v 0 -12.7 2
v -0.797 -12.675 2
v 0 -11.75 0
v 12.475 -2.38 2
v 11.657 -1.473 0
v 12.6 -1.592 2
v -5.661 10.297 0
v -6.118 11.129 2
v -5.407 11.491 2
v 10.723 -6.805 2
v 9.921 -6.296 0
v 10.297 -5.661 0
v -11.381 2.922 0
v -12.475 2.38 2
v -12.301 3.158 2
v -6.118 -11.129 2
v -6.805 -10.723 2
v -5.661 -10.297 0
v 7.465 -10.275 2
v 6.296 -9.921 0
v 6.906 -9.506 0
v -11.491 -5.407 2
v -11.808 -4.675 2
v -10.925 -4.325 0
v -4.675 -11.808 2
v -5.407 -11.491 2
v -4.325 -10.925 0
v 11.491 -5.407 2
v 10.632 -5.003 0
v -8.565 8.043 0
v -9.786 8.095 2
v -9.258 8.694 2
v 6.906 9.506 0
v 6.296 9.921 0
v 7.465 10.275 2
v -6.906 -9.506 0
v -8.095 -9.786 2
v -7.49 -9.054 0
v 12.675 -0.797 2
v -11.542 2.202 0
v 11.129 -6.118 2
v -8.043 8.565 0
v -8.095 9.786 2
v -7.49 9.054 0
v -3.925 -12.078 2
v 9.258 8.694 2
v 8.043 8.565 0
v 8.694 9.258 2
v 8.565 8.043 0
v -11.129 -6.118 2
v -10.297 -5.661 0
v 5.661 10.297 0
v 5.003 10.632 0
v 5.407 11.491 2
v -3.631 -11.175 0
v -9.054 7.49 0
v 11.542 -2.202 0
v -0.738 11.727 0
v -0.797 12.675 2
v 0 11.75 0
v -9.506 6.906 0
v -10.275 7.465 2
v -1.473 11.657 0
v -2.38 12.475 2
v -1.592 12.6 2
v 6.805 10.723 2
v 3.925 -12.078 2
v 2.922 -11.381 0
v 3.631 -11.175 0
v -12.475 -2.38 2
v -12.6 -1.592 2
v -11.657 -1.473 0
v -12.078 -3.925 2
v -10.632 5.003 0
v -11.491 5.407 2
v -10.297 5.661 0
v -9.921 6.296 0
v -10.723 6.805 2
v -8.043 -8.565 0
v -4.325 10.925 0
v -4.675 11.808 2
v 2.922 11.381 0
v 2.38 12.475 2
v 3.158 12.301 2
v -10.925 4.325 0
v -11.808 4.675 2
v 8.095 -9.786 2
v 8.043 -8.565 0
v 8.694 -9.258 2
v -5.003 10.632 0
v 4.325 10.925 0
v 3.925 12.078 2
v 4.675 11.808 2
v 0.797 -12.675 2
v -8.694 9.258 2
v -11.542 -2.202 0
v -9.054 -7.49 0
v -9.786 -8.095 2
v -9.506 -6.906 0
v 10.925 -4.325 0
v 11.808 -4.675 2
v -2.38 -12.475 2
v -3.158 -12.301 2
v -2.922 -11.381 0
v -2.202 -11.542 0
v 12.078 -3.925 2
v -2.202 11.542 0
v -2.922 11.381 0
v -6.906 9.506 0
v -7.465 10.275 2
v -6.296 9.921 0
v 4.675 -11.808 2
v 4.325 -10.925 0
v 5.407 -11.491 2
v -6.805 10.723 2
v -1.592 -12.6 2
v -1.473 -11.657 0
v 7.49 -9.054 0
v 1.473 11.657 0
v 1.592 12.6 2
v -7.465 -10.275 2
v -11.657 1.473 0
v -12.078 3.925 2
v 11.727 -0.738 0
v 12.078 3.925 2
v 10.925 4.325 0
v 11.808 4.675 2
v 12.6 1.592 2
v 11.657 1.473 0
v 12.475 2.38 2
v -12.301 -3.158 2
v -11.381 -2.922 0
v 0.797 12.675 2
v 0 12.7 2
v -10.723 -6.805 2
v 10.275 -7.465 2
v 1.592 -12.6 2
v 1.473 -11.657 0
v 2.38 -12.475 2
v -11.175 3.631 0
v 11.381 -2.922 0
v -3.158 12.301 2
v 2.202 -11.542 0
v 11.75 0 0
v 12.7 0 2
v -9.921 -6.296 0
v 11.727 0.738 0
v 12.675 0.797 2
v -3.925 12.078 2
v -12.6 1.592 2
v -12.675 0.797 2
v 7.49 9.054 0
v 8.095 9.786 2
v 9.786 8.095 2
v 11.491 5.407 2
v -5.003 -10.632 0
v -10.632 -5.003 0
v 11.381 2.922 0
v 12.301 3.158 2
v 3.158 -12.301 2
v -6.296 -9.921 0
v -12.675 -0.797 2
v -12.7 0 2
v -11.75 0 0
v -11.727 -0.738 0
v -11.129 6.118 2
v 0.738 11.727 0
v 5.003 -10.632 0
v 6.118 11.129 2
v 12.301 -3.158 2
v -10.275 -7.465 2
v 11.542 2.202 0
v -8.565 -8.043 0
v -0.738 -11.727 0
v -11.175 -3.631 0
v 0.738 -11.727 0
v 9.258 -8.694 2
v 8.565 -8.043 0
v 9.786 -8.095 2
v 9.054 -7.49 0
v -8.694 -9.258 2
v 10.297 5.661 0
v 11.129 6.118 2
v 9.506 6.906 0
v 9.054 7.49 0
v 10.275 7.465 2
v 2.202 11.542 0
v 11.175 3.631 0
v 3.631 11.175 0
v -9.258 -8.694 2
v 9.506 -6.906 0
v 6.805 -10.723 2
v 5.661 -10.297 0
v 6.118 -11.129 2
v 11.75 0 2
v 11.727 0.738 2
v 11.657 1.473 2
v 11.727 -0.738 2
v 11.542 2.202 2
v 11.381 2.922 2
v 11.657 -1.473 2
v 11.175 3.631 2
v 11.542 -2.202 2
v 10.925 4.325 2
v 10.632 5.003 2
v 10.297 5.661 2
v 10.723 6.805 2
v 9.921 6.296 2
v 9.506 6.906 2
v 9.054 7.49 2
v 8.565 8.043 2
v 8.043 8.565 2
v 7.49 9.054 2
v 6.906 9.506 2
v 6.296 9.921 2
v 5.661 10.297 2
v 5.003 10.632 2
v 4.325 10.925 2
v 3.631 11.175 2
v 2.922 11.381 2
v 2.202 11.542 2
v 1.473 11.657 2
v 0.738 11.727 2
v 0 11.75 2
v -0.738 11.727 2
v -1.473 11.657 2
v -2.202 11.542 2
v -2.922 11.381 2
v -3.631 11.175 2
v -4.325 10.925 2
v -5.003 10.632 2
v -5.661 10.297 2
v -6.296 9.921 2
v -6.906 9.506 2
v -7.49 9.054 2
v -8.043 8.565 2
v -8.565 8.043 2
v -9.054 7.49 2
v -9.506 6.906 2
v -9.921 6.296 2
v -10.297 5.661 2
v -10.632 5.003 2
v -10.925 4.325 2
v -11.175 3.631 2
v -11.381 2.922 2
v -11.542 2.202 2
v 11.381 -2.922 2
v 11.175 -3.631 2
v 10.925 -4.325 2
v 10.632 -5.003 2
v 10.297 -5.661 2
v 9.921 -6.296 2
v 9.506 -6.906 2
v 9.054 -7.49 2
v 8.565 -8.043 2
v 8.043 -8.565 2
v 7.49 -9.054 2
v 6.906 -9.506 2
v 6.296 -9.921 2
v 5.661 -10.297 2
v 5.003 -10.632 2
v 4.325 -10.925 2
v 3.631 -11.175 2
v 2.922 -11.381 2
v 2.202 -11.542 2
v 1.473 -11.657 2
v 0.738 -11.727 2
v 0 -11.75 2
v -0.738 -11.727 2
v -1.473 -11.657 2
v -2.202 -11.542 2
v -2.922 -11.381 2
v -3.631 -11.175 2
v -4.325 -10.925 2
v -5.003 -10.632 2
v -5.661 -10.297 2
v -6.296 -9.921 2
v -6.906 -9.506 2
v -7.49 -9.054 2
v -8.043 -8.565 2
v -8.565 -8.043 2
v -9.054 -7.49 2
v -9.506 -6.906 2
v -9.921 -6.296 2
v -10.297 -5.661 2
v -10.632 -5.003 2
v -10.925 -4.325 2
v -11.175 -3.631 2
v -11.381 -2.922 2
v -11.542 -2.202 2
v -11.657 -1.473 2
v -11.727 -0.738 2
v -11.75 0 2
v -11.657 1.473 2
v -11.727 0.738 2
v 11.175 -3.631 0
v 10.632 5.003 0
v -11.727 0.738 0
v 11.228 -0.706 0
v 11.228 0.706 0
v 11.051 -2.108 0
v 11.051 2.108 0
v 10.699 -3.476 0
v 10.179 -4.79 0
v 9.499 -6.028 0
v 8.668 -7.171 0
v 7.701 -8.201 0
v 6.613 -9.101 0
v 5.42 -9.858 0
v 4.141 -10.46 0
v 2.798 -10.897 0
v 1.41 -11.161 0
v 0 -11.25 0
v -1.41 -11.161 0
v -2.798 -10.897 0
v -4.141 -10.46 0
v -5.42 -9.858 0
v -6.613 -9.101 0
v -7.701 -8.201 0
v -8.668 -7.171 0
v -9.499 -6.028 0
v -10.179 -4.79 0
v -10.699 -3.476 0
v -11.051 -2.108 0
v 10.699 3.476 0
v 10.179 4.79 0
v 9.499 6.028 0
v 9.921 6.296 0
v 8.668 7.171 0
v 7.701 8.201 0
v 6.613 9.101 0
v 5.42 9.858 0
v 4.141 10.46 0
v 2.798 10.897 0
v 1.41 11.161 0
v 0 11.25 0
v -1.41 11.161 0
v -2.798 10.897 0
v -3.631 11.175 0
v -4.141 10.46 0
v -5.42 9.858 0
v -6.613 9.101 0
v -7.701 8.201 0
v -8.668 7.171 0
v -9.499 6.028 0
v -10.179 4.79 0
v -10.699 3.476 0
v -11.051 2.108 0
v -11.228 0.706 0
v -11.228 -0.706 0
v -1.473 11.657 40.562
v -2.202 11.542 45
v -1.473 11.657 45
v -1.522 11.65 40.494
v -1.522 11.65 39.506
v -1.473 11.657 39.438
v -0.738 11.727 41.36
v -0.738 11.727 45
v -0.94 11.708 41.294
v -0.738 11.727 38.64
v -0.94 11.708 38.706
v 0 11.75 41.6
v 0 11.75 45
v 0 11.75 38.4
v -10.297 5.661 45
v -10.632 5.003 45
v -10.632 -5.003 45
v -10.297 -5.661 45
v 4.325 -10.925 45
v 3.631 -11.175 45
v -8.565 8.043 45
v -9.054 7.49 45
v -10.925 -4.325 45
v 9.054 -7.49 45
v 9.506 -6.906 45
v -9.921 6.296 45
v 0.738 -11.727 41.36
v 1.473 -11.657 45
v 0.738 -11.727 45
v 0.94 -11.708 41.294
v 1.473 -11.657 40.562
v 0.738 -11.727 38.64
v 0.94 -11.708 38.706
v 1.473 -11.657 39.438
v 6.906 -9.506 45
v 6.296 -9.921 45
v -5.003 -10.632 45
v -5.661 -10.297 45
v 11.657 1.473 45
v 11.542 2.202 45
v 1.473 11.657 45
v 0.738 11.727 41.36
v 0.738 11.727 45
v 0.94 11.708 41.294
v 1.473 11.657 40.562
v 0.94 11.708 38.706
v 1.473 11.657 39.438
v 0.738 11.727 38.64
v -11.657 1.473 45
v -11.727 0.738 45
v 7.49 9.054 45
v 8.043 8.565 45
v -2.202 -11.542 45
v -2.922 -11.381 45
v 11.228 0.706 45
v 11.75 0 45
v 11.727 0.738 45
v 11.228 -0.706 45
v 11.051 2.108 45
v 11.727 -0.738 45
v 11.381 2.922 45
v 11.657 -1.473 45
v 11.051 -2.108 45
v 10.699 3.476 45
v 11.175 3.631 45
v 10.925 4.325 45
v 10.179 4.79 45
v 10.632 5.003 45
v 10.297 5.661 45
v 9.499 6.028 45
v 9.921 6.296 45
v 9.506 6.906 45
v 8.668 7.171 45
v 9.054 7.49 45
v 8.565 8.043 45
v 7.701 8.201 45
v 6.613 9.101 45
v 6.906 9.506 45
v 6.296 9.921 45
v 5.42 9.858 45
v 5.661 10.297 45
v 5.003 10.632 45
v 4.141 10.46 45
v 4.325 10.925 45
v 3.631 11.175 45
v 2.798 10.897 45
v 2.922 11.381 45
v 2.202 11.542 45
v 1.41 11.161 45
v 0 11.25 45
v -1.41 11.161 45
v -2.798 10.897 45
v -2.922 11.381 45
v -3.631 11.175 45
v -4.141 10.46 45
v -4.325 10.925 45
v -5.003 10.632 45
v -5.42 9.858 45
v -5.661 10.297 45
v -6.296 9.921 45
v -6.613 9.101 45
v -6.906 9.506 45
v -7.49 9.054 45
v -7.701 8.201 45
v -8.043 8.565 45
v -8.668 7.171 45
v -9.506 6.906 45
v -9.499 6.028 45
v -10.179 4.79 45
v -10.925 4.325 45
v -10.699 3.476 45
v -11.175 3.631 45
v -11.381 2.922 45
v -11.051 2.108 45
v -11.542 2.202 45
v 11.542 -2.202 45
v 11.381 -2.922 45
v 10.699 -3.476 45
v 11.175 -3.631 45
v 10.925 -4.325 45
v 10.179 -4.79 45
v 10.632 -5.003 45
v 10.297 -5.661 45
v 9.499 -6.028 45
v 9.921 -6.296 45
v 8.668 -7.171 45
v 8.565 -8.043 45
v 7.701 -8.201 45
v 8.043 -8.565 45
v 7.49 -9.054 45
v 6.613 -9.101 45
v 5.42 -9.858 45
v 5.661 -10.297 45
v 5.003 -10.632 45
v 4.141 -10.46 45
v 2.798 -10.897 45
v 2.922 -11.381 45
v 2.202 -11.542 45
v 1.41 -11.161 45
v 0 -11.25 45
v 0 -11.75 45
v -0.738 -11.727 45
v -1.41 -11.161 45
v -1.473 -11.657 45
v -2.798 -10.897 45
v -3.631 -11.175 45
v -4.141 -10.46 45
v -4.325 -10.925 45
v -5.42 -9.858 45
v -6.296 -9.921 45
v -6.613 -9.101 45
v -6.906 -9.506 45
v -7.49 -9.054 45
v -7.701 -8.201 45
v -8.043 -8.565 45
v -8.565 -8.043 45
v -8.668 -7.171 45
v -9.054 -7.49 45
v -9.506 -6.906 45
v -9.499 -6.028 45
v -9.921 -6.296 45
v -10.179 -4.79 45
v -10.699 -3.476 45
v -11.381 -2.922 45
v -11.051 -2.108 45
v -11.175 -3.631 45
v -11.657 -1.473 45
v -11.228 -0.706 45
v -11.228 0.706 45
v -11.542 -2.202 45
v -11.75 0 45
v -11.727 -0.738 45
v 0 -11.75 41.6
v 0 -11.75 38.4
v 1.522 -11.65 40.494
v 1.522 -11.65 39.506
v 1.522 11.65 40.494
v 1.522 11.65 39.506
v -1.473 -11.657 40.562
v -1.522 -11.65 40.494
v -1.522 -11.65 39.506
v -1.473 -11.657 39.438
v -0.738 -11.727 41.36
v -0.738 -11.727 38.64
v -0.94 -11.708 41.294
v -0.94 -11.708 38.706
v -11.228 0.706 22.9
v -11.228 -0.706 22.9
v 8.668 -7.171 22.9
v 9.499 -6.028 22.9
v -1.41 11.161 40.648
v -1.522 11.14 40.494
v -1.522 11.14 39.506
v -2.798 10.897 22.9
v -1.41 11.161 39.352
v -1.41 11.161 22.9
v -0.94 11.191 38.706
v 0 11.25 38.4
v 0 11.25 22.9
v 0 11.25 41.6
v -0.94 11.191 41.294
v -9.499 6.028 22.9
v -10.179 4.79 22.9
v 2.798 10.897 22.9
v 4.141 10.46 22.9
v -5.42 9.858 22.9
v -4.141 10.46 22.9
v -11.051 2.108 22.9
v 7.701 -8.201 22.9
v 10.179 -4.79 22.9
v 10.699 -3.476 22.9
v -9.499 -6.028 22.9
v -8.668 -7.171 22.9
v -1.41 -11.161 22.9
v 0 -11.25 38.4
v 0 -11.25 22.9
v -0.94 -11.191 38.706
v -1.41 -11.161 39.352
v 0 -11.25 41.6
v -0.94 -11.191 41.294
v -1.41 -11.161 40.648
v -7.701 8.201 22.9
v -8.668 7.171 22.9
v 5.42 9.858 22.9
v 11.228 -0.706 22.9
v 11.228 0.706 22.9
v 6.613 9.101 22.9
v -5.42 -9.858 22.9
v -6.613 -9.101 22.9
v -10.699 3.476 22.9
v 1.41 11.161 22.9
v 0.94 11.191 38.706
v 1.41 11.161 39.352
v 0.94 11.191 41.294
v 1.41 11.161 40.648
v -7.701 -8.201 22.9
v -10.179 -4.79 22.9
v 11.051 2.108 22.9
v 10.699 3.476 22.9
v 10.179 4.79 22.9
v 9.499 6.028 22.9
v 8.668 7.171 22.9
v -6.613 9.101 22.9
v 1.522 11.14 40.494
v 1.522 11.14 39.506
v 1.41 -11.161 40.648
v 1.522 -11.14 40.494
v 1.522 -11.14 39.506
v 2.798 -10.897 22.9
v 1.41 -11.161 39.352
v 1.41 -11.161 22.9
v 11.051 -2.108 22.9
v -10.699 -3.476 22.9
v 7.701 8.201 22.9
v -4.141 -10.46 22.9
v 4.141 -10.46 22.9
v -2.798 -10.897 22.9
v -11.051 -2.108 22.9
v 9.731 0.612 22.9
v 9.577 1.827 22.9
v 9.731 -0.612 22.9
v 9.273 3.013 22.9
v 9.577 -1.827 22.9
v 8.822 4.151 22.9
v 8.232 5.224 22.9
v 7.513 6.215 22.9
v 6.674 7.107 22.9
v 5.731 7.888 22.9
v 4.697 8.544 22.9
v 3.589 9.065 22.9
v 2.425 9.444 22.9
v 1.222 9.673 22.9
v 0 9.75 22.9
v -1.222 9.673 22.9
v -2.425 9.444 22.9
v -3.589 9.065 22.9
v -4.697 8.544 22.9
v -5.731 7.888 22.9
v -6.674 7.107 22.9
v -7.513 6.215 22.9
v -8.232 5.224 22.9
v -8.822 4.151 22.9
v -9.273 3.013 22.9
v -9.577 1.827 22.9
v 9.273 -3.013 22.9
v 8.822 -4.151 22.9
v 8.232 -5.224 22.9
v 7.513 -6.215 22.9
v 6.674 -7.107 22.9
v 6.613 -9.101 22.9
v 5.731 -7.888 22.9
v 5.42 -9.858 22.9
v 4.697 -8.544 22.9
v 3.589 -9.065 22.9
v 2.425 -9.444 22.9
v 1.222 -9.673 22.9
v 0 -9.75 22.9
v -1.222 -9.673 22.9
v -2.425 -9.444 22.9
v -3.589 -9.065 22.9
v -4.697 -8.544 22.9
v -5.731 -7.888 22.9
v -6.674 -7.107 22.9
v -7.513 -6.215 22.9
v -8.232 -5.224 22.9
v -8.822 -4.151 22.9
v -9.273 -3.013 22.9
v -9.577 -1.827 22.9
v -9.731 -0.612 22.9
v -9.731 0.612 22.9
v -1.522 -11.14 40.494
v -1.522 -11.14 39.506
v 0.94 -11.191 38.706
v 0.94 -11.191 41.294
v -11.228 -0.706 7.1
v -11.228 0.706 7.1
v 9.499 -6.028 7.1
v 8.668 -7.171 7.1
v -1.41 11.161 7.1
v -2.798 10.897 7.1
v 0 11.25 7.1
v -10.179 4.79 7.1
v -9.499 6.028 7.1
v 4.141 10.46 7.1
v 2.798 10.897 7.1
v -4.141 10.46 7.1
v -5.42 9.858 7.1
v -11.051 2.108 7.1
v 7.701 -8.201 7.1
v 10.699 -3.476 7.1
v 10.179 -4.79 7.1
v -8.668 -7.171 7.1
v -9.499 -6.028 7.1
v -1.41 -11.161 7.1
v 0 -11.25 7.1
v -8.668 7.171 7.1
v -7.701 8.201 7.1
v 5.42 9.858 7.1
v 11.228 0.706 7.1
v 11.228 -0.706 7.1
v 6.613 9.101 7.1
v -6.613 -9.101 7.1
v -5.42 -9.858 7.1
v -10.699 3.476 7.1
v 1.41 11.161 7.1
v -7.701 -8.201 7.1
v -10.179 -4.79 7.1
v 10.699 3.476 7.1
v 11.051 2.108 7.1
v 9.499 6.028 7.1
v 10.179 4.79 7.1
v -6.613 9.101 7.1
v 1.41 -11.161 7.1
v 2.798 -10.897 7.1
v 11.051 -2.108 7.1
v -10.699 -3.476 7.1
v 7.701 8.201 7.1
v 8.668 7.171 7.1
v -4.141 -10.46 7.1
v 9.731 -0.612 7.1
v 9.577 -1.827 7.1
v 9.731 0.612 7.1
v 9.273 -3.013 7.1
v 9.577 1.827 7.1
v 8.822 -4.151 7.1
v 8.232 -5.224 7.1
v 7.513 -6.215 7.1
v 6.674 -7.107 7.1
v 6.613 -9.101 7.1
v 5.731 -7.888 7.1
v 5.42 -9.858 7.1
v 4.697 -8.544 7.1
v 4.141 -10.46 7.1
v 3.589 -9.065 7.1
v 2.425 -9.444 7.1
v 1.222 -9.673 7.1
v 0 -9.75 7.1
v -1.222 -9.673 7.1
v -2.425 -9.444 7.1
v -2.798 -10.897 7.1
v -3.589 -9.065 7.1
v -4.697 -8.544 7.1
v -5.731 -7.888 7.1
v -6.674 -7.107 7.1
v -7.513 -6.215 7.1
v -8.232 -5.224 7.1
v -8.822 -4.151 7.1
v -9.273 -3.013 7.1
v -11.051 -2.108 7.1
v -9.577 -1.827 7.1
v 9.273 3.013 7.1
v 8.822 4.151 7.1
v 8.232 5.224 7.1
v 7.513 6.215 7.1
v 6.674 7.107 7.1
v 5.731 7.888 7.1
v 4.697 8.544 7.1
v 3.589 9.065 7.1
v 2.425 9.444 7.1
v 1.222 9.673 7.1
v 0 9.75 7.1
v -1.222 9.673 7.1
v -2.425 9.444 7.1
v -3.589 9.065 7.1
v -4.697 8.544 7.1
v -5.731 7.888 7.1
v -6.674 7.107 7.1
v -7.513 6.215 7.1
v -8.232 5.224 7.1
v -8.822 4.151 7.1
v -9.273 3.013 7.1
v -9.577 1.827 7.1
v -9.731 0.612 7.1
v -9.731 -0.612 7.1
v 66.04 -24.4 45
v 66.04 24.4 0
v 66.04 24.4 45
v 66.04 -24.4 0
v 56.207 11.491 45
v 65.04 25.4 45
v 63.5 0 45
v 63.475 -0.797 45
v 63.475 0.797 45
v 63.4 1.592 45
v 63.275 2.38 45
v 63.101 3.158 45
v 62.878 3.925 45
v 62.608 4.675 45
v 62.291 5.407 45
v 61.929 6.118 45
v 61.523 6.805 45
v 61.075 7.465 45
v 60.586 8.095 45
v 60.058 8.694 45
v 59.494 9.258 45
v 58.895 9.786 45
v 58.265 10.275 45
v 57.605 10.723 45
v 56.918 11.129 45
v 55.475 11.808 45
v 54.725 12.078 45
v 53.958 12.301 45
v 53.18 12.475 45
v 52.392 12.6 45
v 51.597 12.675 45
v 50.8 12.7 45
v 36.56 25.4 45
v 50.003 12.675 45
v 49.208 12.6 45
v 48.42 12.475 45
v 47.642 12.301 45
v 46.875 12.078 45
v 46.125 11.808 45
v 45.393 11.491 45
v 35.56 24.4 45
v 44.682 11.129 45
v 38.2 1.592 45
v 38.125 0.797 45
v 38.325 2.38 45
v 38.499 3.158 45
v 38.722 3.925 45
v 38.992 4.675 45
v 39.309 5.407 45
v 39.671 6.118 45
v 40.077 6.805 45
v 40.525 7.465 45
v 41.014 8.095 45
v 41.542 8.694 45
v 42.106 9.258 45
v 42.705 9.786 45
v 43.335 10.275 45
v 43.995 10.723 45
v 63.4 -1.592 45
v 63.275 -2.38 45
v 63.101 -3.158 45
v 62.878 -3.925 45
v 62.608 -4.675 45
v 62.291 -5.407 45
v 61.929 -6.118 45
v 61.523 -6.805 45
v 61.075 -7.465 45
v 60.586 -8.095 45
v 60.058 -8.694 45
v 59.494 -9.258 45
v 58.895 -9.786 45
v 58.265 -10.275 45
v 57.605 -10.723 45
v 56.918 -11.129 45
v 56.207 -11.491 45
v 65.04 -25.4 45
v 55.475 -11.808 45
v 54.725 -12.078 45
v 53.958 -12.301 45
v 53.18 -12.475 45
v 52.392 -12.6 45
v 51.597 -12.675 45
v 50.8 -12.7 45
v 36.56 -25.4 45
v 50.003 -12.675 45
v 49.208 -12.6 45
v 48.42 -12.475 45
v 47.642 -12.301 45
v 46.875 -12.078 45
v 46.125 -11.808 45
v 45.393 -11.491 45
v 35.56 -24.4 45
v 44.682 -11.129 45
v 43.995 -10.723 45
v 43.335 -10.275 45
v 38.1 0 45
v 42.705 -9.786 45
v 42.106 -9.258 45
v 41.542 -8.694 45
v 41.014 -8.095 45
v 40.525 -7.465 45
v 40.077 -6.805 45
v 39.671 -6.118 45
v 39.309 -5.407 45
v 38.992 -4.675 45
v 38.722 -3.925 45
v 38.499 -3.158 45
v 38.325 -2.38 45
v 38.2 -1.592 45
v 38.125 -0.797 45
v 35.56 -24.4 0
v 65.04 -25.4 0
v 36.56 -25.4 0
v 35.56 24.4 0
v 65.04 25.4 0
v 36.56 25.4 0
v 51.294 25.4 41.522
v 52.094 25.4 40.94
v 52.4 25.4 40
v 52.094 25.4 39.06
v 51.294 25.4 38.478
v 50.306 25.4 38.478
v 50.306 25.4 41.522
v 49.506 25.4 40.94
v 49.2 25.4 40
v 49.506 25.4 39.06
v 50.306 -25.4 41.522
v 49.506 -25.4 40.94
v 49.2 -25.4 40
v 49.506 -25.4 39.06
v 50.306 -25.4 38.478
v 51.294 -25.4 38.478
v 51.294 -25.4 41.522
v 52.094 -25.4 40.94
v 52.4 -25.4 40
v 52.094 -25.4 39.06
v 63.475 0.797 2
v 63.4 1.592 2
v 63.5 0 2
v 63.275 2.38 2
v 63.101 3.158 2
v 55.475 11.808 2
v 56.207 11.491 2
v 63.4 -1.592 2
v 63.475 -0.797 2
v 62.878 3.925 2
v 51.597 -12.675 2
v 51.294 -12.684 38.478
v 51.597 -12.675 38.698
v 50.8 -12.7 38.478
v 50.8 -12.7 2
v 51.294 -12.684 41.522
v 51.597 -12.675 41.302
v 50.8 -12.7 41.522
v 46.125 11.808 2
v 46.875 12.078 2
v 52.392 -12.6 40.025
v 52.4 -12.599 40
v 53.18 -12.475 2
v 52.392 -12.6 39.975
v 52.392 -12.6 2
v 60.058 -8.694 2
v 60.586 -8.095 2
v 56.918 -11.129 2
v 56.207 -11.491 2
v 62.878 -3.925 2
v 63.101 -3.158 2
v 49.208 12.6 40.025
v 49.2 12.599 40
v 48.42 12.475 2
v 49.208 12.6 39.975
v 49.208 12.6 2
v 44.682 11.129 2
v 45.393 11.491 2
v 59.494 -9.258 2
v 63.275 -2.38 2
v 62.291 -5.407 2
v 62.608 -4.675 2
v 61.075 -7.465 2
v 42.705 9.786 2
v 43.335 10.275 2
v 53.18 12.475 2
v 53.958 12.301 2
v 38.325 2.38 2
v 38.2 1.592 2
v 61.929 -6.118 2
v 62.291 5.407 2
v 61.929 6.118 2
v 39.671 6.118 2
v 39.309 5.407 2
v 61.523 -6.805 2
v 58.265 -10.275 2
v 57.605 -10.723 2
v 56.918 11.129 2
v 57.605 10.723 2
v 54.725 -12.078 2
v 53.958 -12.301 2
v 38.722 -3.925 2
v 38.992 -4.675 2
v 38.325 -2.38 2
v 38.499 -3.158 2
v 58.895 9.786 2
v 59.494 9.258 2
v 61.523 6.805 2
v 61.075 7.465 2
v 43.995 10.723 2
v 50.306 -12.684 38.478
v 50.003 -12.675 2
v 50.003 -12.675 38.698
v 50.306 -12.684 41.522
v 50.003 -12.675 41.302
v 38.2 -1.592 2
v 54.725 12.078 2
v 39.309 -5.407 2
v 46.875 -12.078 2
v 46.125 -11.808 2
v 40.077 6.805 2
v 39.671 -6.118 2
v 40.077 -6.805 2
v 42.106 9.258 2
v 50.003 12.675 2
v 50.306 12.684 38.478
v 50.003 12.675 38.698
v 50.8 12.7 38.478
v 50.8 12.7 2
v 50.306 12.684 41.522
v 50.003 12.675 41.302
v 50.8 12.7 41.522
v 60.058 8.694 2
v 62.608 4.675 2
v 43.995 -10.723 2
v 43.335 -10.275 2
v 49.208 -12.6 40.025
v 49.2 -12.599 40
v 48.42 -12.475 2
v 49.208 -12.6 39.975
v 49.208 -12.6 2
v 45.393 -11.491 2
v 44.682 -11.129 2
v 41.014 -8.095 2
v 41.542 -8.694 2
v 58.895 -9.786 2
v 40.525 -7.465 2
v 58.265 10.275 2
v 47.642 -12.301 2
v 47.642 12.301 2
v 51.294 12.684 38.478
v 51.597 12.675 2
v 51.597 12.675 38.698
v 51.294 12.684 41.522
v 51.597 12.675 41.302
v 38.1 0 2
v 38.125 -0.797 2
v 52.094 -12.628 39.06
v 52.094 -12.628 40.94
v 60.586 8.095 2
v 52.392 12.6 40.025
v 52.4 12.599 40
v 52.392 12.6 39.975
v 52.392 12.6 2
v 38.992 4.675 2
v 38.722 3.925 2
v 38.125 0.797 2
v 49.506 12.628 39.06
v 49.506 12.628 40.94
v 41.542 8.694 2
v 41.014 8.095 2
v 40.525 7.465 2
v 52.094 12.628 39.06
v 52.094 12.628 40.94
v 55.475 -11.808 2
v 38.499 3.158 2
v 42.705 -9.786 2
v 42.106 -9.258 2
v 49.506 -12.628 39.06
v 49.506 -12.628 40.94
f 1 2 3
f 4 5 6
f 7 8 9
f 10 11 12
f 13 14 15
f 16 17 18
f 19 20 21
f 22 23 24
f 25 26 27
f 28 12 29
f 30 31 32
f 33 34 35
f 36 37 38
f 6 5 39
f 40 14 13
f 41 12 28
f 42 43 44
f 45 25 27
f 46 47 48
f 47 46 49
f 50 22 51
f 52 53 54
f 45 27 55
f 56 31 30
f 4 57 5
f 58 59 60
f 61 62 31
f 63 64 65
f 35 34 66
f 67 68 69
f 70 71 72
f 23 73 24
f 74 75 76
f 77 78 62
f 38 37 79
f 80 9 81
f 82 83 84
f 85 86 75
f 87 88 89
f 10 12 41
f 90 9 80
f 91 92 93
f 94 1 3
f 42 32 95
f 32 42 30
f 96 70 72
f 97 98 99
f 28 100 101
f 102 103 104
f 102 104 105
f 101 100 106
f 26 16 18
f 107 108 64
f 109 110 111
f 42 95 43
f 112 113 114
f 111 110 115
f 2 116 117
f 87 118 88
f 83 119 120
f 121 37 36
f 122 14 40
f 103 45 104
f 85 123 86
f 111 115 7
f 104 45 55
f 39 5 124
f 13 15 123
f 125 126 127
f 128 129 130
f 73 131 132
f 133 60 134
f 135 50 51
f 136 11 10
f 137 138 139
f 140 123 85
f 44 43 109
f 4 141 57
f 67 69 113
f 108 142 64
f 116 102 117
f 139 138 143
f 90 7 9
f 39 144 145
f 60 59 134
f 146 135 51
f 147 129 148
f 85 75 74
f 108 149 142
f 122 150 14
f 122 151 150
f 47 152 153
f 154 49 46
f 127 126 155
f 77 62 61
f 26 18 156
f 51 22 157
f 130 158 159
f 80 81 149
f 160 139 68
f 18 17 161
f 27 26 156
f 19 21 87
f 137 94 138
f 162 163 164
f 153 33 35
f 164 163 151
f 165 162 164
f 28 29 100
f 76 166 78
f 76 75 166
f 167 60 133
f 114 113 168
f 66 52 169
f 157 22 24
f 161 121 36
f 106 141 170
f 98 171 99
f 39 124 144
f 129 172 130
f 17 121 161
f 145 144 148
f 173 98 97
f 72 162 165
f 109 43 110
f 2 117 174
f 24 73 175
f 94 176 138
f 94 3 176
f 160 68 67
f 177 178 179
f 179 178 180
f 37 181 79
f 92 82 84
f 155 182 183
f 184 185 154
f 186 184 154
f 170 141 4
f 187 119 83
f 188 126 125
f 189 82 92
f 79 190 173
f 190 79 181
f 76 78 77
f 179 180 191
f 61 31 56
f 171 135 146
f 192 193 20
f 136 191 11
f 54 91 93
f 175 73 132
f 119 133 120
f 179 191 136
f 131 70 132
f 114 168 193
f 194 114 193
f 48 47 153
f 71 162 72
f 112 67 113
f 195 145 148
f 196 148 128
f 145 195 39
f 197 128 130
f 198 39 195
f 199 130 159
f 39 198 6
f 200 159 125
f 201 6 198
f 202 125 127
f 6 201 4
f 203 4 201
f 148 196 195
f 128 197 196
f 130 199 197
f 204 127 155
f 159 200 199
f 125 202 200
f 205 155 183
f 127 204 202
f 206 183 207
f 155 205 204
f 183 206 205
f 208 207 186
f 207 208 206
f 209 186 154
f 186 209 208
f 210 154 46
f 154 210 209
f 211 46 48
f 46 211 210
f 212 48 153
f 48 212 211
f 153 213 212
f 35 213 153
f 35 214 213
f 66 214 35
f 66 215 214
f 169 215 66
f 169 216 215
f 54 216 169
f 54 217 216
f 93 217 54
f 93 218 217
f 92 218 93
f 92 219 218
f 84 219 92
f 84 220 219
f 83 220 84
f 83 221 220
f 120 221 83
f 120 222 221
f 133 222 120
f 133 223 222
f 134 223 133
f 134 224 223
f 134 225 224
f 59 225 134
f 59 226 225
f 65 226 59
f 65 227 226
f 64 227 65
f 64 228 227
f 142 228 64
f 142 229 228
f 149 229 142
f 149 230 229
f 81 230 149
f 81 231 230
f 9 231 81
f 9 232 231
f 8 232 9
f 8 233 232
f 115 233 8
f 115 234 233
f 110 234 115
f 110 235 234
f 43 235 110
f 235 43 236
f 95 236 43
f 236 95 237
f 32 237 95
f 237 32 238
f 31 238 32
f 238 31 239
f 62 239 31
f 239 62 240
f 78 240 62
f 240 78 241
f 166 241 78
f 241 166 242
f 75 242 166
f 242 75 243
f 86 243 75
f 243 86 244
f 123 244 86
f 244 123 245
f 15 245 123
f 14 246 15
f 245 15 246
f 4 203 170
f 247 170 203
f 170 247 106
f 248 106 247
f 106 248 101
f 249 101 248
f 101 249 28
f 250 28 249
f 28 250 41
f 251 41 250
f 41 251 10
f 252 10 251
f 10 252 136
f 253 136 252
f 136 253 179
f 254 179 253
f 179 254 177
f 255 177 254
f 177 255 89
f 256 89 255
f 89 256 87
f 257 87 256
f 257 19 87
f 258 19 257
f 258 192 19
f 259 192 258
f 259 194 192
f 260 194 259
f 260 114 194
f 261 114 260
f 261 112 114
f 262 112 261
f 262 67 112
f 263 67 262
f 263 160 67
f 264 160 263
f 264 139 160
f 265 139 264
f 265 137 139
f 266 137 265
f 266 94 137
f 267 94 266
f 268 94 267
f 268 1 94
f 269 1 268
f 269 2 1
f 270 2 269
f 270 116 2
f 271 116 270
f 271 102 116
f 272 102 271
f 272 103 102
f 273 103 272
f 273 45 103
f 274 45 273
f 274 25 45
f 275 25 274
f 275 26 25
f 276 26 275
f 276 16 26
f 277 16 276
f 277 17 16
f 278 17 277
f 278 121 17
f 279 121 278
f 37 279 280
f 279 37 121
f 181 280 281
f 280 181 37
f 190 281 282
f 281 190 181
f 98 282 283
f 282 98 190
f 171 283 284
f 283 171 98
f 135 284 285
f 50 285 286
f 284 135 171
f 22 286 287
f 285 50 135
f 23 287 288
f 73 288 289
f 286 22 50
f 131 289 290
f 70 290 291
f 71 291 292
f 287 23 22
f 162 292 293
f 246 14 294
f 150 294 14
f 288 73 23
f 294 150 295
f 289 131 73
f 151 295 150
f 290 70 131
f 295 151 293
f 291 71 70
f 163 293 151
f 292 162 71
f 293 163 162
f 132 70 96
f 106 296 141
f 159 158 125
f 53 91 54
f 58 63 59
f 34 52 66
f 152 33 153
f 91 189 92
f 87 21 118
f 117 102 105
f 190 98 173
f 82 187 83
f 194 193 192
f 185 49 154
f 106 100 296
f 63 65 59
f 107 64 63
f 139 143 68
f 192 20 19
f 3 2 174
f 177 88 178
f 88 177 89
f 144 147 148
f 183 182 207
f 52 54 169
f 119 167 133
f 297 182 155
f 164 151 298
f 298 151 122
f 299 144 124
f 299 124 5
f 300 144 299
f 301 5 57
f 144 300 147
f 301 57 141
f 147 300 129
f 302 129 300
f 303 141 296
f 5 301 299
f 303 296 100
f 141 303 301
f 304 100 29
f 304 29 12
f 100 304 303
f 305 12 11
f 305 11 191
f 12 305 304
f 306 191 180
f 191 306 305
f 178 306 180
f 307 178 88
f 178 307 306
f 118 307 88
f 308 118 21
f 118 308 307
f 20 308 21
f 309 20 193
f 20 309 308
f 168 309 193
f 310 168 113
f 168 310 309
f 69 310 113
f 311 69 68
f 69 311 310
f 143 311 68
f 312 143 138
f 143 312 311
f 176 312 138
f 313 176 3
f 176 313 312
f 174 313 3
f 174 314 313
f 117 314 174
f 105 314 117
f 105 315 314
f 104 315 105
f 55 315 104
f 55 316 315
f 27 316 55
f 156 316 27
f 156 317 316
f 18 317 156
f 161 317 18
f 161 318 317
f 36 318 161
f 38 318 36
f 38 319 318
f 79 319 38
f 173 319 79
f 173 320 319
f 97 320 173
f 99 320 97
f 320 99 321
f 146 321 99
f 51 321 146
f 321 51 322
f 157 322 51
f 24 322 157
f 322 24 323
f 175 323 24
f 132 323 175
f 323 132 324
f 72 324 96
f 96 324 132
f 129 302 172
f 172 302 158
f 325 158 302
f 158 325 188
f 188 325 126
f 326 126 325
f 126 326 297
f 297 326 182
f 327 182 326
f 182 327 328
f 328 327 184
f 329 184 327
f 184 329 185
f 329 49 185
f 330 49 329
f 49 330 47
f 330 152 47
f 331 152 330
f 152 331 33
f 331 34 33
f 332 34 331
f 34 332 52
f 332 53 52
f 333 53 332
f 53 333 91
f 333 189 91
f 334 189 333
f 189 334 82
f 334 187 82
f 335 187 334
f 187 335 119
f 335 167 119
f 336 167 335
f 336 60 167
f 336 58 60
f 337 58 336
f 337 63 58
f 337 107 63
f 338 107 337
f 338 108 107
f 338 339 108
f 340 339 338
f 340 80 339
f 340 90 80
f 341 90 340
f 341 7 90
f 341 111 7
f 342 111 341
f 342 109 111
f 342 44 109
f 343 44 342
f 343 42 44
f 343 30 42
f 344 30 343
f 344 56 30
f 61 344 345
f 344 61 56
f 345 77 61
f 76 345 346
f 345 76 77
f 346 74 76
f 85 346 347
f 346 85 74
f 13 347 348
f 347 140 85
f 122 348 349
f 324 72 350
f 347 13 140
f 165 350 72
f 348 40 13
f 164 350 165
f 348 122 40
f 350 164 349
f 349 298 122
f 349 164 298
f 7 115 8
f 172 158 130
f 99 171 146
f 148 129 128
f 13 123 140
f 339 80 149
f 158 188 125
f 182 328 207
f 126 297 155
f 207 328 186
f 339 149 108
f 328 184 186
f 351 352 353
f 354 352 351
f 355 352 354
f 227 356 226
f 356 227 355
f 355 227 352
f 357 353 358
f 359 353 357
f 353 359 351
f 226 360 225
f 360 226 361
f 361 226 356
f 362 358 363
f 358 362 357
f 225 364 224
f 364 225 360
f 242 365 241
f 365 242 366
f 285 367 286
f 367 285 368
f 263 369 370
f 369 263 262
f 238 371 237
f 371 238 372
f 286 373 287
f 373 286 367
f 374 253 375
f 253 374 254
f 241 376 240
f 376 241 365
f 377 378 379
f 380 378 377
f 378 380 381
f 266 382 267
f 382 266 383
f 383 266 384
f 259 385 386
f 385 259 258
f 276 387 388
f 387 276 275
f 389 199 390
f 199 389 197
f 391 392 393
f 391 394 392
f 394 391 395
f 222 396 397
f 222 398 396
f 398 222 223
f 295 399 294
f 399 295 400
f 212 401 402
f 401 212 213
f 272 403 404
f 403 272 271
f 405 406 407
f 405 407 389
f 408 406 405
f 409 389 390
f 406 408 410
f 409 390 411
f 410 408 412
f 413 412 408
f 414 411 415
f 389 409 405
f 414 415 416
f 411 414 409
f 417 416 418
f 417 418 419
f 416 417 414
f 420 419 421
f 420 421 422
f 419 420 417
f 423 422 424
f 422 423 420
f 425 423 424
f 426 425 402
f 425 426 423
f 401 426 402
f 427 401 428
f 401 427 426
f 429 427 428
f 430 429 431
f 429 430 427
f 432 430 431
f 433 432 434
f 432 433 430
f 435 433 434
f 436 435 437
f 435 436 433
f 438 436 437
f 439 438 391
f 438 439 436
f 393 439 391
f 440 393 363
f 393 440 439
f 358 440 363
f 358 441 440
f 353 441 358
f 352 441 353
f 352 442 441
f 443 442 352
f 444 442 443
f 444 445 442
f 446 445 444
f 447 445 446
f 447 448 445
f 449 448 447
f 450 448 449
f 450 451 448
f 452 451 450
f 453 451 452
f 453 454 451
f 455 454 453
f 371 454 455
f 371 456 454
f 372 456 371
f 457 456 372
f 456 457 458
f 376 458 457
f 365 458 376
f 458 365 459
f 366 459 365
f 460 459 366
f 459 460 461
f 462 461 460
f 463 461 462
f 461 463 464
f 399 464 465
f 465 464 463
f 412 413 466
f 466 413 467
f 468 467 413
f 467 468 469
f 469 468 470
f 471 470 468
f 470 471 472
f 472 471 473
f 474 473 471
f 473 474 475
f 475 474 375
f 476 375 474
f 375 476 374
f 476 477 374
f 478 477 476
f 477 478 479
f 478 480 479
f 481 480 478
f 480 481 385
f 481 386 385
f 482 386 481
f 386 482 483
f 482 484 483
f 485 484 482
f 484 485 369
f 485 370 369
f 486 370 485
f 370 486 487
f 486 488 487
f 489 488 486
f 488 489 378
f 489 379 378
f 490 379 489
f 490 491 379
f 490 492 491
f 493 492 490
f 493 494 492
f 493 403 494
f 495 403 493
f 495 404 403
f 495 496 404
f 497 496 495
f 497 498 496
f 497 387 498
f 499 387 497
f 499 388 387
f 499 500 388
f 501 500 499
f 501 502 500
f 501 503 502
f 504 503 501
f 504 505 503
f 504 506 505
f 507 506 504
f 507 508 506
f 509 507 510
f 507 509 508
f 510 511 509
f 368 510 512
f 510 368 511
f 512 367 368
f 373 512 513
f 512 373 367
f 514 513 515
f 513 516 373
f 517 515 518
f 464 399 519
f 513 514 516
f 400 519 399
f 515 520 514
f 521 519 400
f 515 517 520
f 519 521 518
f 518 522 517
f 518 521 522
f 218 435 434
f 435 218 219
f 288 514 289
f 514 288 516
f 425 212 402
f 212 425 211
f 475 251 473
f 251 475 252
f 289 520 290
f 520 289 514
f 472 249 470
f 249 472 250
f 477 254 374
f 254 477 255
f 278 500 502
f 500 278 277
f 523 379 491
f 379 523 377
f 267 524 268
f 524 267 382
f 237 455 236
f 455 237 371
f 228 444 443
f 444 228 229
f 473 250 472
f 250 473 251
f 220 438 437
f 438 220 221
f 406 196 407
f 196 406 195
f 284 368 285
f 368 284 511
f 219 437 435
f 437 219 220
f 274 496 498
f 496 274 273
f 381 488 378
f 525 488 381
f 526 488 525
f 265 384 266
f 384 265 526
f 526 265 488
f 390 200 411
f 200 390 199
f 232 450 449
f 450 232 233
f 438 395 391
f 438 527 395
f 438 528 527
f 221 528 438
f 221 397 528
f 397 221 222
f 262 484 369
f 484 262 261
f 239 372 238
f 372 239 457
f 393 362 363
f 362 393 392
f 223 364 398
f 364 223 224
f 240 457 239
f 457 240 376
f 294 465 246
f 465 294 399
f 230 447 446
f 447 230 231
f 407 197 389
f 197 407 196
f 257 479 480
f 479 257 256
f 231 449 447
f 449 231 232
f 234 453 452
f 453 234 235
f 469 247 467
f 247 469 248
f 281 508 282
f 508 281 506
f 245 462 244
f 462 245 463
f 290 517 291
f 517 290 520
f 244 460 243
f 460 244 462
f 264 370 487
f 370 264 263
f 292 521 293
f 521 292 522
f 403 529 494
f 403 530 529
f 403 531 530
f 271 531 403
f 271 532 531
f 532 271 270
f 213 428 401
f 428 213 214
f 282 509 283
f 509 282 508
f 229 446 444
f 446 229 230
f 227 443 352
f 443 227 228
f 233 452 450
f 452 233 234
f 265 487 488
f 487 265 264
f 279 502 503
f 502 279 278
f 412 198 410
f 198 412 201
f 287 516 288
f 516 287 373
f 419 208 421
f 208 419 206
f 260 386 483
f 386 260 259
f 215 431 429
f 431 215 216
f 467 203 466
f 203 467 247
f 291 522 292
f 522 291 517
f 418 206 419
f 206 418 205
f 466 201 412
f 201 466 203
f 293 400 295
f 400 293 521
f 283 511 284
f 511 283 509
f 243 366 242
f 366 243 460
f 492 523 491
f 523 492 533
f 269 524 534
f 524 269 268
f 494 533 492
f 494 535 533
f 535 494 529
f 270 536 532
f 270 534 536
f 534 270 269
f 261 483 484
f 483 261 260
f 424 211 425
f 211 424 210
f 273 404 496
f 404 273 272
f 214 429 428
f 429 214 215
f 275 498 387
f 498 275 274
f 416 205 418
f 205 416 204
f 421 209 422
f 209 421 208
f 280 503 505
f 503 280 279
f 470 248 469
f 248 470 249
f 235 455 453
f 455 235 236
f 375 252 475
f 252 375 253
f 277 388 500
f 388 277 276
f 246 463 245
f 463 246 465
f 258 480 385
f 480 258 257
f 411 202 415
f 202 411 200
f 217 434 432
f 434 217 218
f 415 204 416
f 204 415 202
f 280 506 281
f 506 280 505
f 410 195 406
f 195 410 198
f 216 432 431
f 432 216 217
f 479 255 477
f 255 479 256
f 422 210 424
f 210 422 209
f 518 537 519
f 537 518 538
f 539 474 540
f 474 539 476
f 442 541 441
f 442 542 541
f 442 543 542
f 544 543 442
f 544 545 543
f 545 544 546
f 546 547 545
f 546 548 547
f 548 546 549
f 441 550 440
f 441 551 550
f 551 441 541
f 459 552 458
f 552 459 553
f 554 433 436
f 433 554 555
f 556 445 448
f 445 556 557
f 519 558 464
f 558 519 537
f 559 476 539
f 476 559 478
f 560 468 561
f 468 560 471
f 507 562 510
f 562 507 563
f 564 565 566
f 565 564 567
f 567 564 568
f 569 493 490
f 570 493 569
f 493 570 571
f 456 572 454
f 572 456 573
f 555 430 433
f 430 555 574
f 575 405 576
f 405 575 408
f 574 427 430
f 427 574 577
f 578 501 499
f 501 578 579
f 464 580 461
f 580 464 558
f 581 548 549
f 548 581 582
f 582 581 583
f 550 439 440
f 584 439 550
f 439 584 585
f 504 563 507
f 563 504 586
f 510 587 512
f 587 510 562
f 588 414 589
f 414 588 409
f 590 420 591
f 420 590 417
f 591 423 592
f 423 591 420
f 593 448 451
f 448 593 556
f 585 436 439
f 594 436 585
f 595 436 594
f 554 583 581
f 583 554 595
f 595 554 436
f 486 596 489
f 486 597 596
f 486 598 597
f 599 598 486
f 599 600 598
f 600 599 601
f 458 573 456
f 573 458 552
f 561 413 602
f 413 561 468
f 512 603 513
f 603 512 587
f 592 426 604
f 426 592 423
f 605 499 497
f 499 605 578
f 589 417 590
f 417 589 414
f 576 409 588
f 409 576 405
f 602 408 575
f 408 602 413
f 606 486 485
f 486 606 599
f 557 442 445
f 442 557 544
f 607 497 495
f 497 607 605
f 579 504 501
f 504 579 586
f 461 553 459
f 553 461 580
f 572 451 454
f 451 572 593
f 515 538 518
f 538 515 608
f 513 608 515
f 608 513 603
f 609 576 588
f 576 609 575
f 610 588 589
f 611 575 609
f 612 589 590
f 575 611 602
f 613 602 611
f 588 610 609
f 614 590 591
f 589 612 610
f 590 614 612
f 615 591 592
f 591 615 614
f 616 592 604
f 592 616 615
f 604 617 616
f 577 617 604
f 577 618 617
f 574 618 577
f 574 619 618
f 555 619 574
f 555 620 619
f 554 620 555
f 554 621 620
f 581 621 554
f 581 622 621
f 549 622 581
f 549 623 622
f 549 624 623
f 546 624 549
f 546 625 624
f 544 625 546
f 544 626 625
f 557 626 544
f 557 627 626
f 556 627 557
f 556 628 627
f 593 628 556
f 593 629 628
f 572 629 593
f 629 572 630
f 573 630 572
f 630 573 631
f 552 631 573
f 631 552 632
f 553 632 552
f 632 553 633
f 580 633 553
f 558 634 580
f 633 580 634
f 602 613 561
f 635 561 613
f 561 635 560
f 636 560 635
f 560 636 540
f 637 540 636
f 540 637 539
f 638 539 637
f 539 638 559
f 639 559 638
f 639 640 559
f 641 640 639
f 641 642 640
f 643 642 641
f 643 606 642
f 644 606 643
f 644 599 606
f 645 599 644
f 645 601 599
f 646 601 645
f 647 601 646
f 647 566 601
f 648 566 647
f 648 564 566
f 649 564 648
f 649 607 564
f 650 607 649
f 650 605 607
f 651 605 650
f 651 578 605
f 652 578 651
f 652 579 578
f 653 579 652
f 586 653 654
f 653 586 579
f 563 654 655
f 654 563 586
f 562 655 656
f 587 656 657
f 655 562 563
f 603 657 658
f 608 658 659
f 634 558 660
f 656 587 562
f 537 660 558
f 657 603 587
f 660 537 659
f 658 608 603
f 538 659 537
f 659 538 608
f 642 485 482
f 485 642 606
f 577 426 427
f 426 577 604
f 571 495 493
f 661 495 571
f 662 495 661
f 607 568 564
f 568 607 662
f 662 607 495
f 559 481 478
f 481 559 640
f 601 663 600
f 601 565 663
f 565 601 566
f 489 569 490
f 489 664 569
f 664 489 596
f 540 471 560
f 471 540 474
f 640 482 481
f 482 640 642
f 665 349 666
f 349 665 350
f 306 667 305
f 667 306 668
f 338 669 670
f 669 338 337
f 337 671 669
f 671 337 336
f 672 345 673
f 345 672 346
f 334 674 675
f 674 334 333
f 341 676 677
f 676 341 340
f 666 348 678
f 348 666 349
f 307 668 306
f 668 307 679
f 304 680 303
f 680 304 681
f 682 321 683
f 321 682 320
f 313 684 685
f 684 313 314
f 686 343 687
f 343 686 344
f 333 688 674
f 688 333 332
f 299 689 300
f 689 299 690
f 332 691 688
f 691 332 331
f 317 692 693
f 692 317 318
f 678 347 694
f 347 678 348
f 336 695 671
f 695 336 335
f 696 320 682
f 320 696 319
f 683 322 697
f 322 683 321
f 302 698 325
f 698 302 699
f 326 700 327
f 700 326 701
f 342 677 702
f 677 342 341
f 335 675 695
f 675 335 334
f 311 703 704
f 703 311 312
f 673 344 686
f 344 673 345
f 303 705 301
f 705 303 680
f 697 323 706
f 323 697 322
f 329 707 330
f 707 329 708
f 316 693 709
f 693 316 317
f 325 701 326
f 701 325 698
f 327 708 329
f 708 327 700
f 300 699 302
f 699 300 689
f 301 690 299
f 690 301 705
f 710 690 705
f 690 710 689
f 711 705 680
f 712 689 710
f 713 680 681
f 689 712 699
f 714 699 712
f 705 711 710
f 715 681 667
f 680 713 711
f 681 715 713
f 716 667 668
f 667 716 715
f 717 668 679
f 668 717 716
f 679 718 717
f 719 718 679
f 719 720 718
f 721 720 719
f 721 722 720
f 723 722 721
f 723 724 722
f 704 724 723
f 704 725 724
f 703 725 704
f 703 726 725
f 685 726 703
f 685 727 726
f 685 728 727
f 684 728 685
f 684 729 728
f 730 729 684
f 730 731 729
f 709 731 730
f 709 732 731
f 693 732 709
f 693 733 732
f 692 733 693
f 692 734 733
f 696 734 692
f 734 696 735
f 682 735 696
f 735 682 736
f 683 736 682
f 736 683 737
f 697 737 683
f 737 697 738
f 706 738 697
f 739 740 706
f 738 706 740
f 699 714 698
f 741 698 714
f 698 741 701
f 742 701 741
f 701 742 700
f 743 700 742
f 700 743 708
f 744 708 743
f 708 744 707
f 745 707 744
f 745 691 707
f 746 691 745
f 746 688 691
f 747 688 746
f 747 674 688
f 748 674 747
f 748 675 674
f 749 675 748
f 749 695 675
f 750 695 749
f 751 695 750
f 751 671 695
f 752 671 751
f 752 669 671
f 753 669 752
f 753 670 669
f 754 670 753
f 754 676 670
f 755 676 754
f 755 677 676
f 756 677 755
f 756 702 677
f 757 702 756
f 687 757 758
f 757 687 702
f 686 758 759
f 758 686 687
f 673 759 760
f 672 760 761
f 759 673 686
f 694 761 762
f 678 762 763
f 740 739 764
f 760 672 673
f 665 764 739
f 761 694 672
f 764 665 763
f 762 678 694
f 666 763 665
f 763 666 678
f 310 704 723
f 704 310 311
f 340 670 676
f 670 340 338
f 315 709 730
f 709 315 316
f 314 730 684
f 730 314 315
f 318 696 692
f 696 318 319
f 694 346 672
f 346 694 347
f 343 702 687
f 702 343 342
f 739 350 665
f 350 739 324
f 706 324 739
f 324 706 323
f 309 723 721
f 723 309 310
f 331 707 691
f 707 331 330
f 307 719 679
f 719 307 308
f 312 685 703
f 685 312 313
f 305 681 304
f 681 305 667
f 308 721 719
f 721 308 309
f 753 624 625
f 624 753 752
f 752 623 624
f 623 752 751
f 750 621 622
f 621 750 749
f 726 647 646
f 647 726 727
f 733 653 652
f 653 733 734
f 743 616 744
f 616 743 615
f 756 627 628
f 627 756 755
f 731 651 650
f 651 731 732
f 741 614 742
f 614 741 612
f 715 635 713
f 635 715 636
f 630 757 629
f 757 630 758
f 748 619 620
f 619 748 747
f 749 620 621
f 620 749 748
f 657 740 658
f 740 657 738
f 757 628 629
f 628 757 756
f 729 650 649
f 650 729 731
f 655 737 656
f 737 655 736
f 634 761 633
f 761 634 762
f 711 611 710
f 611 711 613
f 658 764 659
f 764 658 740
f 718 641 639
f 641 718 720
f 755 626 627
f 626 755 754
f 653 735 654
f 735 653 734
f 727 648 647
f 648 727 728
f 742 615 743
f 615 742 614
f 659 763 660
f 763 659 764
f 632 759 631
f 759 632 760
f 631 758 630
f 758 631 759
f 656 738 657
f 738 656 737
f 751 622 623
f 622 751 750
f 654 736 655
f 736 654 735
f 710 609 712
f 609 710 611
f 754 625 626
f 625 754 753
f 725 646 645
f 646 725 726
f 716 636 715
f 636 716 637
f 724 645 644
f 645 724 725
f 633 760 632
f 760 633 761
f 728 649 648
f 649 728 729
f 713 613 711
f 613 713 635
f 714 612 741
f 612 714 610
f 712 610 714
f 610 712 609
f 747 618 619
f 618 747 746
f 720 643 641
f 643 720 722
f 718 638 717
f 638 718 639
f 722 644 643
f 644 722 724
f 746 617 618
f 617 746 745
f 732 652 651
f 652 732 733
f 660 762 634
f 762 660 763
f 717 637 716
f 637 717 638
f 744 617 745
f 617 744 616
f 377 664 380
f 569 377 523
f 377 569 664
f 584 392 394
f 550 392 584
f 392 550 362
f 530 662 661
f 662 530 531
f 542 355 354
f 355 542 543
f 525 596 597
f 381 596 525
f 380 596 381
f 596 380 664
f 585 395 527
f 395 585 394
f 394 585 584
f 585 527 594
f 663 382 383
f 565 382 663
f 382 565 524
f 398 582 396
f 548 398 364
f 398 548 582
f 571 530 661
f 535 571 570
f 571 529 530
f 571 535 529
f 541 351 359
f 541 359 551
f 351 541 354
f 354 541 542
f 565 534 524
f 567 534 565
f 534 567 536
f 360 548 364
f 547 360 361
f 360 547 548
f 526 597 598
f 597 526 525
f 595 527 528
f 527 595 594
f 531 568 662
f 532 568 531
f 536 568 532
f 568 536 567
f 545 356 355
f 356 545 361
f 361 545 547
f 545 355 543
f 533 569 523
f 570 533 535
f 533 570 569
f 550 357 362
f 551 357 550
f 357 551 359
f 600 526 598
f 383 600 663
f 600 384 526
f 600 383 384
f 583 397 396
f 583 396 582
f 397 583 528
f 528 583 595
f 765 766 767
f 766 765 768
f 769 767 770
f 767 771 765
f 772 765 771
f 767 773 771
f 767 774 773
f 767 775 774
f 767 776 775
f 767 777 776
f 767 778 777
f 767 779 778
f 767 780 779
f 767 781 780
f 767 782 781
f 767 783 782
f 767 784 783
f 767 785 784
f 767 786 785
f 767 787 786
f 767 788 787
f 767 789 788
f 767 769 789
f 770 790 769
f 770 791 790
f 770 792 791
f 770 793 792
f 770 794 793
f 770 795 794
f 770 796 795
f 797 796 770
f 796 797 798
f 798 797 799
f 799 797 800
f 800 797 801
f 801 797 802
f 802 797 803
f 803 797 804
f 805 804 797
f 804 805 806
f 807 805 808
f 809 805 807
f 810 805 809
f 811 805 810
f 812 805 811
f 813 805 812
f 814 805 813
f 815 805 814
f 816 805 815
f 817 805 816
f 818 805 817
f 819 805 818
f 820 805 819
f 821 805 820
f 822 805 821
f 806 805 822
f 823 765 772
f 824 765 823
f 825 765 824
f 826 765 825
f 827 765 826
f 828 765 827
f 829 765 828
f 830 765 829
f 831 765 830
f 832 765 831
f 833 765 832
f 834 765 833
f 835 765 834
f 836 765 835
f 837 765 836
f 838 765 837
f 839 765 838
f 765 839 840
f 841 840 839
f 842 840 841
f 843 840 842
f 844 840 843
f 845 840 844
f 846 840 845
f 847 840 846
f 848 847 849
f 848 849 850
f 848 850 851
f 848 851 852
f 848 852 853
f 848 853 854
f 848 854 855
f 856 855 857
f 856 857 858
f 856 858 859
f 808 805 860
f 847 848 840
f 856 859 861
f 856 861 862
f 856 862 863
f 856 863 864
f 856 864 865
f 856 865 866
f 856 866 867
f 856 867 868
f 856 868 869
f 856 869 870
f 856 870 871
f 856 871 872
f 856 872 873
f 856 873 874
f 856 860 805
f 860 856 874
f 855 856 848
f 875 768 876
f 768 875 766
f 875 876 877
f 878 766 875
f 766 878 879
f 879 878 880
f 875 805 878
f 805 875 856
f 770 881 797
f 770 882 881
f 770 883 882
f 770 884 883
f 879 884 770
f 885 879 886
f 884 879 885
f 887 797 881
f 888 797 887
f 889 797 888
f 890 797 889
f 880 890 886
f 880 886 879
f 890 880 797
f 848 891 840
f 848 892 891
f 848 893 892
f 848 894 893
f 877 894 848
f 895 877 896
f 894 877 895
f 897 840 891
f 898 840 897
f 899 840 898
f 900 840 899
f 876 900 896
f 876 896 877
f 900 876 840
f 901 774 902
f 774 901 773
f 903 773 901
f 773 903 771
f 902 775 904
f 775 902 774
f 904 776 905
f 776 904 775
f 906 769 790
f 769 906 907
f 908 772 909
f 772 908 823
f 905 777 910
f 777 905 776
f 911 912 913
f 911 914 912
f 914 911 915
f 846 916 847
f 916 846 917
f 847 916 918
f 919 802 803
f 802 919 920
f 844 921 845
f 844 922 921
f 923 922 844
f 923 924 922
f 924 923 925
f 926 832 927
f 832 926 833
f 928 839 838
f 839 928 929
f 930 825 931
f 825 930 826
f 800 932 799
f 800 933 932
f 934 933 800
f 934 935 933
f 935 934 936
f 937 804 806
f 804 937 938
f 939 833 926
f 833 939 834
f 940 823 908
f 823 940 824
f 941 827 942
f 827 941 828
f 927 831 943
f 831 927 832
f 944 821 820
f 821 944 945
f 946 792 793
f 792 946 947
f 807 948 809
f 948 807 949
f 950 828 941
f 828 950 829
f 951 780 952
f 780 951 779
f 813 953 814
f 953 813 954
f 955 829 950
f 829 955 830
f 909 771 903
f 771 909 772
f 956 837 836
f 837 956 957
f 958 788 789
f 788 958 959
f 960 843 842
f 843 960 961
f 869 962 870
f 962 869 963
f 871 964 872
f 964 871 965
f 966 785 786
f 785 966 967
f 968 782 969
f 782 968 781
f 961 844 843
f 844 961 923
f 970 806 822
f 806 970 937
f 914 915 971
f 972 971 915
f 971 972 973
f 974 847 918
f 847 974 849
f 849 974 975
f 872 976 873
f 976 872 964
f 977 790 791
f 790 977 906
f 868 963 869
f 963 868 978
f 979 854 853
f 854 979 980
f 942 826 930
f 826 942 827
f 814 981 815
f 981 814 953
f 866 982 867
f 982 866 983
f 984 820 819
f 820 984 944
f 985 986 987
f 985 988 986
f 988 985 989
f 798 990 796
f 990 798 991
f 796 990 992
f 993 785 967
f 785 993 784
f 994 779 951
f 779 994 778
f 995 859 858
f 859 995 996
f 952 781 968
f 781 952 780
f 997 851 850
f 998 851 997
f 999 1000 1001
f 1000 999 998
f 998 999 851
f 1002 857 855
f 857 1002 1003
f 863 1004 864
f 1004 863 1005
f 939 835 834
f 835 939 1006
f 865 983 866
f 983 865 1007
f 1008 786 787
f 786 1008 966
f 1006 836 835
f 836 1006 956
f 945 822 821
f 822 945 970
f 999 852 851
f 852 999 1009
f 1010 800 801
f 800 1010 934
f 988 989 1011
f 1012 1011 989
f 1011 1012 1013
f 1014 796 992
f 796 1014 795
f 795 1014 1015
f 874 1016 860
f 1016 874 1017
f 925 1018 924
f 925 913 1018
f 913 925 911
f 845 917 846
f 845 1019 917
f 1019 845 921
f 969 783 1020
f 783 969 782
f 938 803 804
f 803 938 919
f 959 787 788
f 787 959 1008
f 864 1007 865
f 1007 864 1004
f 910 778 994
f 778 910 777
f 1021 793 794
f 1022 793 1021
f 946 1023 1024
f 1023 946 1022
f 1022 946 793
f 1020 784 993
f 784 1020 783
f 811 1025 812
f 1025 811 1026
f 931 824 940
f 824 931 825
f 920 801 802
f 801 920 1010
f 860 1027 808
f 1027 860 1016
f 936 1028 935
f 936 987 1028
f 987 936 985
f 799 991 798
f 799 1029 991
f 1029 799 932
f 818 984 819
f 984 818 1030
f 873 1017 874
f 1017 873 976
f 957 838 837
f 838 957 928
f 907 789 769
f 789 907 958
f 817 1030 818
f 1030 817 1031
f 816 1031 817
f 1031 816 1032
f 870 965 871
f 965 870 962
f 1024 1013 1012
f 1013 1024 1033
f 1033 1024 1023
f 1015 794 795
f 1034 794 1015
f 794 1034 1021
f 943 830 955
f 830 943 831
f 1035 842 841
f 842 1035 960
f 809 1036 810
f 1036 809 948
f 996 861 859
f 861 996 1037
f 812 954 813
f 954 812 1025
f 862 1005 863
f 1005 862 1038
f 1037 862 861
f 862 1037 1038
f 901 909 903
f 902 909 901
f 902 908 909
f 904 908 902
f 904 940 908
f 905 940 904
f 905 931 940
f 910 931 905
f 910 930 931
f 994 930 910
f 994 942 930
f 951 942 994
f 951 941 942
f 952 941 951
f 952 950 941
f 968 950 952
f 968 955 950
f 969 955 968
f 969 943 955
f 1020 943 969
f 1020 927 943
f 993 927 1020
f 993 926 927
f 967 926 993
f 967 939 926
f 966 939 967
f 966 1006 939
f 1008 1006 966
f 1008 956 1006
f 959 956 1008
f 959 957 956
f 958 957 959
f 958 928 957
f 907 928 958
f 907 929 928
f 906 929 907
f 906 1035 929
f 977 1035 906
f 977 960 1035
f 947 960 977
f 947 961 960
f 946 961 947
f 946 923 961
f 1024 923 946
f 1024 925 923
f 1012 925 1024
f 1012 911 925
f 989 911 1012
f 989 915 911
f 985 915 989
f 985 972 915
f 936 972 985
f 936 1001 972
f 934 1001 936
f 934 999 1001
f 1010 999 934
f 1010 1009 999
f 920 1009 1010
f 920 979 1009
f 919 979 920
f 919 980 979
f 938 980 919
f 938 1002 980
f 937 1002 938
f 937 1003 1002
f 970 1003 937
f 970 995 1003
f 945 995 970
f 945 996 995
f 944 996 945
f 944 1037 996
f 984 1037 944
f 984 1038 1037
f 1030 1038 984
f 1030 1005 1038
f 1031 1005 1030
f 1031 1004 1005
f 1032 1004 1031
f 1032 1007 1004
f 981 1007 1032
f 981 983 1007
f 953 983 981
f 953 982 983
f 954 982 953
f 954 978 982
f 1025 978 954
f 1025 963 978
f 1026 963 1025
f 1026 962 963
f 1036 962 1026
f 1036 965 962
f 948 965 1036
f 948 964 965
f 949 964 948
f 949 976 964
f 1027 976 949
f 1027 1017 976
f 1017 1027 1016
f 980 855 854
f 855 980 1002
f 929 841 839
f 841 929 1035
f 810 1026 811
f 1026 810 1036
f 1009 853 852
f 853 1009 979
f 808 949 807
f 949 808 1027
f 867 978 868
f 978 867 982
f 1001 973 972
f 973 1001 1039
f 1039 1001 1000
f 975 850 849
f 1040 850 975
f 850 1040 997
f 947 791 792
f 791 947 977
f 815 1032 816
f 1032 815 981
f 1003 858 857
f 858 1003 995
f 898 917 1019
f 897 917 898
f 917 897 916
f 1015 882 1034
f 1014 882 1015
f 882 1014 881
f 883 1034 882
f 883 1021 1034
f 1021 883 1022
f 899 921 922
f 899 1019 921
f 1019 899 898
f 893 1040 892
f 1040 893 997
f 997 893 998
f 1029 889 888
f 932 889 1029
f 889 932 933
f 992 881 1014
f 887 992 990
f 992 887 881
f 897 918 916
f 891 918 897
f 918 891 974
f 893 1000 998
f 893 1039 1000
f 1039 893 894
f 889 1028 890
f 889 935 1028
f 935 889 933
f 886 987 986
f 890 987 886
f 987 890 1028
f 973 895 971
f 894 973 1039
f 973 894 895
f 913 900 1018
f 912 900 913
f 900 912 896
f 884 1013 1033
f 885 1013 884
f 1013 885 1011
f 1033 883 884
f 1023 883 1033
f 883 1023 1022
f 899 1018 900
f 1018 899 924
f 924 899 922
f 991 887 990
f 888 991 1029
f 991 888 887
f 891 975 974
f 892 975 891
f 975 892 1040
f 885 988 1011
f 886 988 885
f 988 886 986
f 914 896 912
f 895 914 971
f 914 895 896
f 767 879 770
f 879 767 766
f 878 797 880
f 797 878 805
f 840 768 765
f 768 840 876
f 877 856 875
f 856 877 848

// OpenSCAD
//improving rendering speed.
draft = true;   // sets rendering quality to draft.
$fs = draft ? 5 : 0.5;
$fa = 10;


module 888_2004(height = 45, height_of_mini_cylinder = 2, draft = true)
{

bearing_screw_length = 30;

	difference ()
    {

        union ()    // top cap 
        {   
            translate([0,0,height_of_mini_cylinder])
                rotate([0,180,0])
                    cylinder(h = height_of_mini_cylinder, r1 = main_tube_outer_diameter/2, r2 = (main_tube_inner_diameter)/2, $fn = draft ? 100 : 200);

            cylinder (h = height, d = main_tube_inner_diameter, $fn = draft ? 100 : 200);
        }

        translate([0, 0, bearing_screw_length - 608_bearing_thickness])
            cylinder (h= height + global_clearance, d = 608_bearing_outer_diameter, $fn = draft ? 50 : 100);

        cylinder (h= 608_bearing_thickness, d = 608_bearing_outer_diameter, $fn = draft ? 50 : 100);

        cylinder (h= height, d = 608_bearing_outer_diameter - 3, $fn = draft ? 50 : 100);


        //screw
        translate([-main_tube_inner_diameter/2 - global_clearance/2, 0, 40])
            rotate([0,90,0])
                cylinder(h = main_tube_inner_diameter + global_clearance, r = M3_screw_diameter/2, $fn = draft ? 10 : 20);
    }
}



module 888_2004_drillhelper(height = 45, height_of_mini_cylinder = 2)
{
    difference (){

    translate([-(main_tube_outer_diameter + 2* thickness_between_tubes)/2,- main_tube_outer_diameter,0])
        cube ([main_tube_outer_diameter + 2*thickness_between_tubes,2*main_tube_outer_diameter,height]);
            
            //tube
                    translate([0,0,height_of_mini_cylinder])
                            cylinder(h=height + global_clearance,r = main_tube_outer_diameter/2,$fn = draft ? 100 : 200);

            //screw
                    translate([0,main_tube_outer_diameter + global_clearance/2,40])
                        rotate([90,0,0])
                            cylinder(h = 2 * main_tube_outer_diameter + global_clearance, r = M3_screw_diameter/2, $fn = draft ? 10 : 20);
            
            //bevelled edge
                    translate([(main_tube_outer_diameter + 2*thickness_between_tubes)/2, main_tube_outer_diameter - 1,- global_clearance/2])
                        rotate([0,0,45])
                            cube([main_tube_outer_diameter,main_tube_outer_diameter,height + global_clearance]);

            mirror ([1,0,0])
                    translate([(main_tube_outer_diameter + 2*thickness_between_tubes)/2, main_tube_outer_diameter - 1,- global_clearance/2])
                        rotate([0,0,45])
                            cube([main_tube_outer_diameter,main_tube_outer_diameter,height + global_clearance]);


            mirror([0,1,0])
                    translate([(main_tube_outer_diameter + 2*thickness_between_tubes)/2, main_tube_outer_diameter - 1,- global_clearance/2])
                        rotate([0,0,45])
                            cube([main_tube_outer_diameter,main_tube_outer_diameter,height + global_clearance]);

            
            mirror ([1,0,0])
                mirror([0,1,0])
                    translate([(main_tube_outer_diameter + 2*thickness_between_tubes)/2, main_tube_outer_diameter - 1,- global_clearance/2])
                        rotate([0,0,45])
                            cube([main_tube_outer_diameter,main_tube_outer_diameter,height + global_clearance]);
    //final difference
    }
//final module    
}


rotate([0,0,90])
    888_2004();

translate([2*main_tube_outer_diameter,0,0])
    888_2004_drillhelper();


include <../Parameters.scad>
